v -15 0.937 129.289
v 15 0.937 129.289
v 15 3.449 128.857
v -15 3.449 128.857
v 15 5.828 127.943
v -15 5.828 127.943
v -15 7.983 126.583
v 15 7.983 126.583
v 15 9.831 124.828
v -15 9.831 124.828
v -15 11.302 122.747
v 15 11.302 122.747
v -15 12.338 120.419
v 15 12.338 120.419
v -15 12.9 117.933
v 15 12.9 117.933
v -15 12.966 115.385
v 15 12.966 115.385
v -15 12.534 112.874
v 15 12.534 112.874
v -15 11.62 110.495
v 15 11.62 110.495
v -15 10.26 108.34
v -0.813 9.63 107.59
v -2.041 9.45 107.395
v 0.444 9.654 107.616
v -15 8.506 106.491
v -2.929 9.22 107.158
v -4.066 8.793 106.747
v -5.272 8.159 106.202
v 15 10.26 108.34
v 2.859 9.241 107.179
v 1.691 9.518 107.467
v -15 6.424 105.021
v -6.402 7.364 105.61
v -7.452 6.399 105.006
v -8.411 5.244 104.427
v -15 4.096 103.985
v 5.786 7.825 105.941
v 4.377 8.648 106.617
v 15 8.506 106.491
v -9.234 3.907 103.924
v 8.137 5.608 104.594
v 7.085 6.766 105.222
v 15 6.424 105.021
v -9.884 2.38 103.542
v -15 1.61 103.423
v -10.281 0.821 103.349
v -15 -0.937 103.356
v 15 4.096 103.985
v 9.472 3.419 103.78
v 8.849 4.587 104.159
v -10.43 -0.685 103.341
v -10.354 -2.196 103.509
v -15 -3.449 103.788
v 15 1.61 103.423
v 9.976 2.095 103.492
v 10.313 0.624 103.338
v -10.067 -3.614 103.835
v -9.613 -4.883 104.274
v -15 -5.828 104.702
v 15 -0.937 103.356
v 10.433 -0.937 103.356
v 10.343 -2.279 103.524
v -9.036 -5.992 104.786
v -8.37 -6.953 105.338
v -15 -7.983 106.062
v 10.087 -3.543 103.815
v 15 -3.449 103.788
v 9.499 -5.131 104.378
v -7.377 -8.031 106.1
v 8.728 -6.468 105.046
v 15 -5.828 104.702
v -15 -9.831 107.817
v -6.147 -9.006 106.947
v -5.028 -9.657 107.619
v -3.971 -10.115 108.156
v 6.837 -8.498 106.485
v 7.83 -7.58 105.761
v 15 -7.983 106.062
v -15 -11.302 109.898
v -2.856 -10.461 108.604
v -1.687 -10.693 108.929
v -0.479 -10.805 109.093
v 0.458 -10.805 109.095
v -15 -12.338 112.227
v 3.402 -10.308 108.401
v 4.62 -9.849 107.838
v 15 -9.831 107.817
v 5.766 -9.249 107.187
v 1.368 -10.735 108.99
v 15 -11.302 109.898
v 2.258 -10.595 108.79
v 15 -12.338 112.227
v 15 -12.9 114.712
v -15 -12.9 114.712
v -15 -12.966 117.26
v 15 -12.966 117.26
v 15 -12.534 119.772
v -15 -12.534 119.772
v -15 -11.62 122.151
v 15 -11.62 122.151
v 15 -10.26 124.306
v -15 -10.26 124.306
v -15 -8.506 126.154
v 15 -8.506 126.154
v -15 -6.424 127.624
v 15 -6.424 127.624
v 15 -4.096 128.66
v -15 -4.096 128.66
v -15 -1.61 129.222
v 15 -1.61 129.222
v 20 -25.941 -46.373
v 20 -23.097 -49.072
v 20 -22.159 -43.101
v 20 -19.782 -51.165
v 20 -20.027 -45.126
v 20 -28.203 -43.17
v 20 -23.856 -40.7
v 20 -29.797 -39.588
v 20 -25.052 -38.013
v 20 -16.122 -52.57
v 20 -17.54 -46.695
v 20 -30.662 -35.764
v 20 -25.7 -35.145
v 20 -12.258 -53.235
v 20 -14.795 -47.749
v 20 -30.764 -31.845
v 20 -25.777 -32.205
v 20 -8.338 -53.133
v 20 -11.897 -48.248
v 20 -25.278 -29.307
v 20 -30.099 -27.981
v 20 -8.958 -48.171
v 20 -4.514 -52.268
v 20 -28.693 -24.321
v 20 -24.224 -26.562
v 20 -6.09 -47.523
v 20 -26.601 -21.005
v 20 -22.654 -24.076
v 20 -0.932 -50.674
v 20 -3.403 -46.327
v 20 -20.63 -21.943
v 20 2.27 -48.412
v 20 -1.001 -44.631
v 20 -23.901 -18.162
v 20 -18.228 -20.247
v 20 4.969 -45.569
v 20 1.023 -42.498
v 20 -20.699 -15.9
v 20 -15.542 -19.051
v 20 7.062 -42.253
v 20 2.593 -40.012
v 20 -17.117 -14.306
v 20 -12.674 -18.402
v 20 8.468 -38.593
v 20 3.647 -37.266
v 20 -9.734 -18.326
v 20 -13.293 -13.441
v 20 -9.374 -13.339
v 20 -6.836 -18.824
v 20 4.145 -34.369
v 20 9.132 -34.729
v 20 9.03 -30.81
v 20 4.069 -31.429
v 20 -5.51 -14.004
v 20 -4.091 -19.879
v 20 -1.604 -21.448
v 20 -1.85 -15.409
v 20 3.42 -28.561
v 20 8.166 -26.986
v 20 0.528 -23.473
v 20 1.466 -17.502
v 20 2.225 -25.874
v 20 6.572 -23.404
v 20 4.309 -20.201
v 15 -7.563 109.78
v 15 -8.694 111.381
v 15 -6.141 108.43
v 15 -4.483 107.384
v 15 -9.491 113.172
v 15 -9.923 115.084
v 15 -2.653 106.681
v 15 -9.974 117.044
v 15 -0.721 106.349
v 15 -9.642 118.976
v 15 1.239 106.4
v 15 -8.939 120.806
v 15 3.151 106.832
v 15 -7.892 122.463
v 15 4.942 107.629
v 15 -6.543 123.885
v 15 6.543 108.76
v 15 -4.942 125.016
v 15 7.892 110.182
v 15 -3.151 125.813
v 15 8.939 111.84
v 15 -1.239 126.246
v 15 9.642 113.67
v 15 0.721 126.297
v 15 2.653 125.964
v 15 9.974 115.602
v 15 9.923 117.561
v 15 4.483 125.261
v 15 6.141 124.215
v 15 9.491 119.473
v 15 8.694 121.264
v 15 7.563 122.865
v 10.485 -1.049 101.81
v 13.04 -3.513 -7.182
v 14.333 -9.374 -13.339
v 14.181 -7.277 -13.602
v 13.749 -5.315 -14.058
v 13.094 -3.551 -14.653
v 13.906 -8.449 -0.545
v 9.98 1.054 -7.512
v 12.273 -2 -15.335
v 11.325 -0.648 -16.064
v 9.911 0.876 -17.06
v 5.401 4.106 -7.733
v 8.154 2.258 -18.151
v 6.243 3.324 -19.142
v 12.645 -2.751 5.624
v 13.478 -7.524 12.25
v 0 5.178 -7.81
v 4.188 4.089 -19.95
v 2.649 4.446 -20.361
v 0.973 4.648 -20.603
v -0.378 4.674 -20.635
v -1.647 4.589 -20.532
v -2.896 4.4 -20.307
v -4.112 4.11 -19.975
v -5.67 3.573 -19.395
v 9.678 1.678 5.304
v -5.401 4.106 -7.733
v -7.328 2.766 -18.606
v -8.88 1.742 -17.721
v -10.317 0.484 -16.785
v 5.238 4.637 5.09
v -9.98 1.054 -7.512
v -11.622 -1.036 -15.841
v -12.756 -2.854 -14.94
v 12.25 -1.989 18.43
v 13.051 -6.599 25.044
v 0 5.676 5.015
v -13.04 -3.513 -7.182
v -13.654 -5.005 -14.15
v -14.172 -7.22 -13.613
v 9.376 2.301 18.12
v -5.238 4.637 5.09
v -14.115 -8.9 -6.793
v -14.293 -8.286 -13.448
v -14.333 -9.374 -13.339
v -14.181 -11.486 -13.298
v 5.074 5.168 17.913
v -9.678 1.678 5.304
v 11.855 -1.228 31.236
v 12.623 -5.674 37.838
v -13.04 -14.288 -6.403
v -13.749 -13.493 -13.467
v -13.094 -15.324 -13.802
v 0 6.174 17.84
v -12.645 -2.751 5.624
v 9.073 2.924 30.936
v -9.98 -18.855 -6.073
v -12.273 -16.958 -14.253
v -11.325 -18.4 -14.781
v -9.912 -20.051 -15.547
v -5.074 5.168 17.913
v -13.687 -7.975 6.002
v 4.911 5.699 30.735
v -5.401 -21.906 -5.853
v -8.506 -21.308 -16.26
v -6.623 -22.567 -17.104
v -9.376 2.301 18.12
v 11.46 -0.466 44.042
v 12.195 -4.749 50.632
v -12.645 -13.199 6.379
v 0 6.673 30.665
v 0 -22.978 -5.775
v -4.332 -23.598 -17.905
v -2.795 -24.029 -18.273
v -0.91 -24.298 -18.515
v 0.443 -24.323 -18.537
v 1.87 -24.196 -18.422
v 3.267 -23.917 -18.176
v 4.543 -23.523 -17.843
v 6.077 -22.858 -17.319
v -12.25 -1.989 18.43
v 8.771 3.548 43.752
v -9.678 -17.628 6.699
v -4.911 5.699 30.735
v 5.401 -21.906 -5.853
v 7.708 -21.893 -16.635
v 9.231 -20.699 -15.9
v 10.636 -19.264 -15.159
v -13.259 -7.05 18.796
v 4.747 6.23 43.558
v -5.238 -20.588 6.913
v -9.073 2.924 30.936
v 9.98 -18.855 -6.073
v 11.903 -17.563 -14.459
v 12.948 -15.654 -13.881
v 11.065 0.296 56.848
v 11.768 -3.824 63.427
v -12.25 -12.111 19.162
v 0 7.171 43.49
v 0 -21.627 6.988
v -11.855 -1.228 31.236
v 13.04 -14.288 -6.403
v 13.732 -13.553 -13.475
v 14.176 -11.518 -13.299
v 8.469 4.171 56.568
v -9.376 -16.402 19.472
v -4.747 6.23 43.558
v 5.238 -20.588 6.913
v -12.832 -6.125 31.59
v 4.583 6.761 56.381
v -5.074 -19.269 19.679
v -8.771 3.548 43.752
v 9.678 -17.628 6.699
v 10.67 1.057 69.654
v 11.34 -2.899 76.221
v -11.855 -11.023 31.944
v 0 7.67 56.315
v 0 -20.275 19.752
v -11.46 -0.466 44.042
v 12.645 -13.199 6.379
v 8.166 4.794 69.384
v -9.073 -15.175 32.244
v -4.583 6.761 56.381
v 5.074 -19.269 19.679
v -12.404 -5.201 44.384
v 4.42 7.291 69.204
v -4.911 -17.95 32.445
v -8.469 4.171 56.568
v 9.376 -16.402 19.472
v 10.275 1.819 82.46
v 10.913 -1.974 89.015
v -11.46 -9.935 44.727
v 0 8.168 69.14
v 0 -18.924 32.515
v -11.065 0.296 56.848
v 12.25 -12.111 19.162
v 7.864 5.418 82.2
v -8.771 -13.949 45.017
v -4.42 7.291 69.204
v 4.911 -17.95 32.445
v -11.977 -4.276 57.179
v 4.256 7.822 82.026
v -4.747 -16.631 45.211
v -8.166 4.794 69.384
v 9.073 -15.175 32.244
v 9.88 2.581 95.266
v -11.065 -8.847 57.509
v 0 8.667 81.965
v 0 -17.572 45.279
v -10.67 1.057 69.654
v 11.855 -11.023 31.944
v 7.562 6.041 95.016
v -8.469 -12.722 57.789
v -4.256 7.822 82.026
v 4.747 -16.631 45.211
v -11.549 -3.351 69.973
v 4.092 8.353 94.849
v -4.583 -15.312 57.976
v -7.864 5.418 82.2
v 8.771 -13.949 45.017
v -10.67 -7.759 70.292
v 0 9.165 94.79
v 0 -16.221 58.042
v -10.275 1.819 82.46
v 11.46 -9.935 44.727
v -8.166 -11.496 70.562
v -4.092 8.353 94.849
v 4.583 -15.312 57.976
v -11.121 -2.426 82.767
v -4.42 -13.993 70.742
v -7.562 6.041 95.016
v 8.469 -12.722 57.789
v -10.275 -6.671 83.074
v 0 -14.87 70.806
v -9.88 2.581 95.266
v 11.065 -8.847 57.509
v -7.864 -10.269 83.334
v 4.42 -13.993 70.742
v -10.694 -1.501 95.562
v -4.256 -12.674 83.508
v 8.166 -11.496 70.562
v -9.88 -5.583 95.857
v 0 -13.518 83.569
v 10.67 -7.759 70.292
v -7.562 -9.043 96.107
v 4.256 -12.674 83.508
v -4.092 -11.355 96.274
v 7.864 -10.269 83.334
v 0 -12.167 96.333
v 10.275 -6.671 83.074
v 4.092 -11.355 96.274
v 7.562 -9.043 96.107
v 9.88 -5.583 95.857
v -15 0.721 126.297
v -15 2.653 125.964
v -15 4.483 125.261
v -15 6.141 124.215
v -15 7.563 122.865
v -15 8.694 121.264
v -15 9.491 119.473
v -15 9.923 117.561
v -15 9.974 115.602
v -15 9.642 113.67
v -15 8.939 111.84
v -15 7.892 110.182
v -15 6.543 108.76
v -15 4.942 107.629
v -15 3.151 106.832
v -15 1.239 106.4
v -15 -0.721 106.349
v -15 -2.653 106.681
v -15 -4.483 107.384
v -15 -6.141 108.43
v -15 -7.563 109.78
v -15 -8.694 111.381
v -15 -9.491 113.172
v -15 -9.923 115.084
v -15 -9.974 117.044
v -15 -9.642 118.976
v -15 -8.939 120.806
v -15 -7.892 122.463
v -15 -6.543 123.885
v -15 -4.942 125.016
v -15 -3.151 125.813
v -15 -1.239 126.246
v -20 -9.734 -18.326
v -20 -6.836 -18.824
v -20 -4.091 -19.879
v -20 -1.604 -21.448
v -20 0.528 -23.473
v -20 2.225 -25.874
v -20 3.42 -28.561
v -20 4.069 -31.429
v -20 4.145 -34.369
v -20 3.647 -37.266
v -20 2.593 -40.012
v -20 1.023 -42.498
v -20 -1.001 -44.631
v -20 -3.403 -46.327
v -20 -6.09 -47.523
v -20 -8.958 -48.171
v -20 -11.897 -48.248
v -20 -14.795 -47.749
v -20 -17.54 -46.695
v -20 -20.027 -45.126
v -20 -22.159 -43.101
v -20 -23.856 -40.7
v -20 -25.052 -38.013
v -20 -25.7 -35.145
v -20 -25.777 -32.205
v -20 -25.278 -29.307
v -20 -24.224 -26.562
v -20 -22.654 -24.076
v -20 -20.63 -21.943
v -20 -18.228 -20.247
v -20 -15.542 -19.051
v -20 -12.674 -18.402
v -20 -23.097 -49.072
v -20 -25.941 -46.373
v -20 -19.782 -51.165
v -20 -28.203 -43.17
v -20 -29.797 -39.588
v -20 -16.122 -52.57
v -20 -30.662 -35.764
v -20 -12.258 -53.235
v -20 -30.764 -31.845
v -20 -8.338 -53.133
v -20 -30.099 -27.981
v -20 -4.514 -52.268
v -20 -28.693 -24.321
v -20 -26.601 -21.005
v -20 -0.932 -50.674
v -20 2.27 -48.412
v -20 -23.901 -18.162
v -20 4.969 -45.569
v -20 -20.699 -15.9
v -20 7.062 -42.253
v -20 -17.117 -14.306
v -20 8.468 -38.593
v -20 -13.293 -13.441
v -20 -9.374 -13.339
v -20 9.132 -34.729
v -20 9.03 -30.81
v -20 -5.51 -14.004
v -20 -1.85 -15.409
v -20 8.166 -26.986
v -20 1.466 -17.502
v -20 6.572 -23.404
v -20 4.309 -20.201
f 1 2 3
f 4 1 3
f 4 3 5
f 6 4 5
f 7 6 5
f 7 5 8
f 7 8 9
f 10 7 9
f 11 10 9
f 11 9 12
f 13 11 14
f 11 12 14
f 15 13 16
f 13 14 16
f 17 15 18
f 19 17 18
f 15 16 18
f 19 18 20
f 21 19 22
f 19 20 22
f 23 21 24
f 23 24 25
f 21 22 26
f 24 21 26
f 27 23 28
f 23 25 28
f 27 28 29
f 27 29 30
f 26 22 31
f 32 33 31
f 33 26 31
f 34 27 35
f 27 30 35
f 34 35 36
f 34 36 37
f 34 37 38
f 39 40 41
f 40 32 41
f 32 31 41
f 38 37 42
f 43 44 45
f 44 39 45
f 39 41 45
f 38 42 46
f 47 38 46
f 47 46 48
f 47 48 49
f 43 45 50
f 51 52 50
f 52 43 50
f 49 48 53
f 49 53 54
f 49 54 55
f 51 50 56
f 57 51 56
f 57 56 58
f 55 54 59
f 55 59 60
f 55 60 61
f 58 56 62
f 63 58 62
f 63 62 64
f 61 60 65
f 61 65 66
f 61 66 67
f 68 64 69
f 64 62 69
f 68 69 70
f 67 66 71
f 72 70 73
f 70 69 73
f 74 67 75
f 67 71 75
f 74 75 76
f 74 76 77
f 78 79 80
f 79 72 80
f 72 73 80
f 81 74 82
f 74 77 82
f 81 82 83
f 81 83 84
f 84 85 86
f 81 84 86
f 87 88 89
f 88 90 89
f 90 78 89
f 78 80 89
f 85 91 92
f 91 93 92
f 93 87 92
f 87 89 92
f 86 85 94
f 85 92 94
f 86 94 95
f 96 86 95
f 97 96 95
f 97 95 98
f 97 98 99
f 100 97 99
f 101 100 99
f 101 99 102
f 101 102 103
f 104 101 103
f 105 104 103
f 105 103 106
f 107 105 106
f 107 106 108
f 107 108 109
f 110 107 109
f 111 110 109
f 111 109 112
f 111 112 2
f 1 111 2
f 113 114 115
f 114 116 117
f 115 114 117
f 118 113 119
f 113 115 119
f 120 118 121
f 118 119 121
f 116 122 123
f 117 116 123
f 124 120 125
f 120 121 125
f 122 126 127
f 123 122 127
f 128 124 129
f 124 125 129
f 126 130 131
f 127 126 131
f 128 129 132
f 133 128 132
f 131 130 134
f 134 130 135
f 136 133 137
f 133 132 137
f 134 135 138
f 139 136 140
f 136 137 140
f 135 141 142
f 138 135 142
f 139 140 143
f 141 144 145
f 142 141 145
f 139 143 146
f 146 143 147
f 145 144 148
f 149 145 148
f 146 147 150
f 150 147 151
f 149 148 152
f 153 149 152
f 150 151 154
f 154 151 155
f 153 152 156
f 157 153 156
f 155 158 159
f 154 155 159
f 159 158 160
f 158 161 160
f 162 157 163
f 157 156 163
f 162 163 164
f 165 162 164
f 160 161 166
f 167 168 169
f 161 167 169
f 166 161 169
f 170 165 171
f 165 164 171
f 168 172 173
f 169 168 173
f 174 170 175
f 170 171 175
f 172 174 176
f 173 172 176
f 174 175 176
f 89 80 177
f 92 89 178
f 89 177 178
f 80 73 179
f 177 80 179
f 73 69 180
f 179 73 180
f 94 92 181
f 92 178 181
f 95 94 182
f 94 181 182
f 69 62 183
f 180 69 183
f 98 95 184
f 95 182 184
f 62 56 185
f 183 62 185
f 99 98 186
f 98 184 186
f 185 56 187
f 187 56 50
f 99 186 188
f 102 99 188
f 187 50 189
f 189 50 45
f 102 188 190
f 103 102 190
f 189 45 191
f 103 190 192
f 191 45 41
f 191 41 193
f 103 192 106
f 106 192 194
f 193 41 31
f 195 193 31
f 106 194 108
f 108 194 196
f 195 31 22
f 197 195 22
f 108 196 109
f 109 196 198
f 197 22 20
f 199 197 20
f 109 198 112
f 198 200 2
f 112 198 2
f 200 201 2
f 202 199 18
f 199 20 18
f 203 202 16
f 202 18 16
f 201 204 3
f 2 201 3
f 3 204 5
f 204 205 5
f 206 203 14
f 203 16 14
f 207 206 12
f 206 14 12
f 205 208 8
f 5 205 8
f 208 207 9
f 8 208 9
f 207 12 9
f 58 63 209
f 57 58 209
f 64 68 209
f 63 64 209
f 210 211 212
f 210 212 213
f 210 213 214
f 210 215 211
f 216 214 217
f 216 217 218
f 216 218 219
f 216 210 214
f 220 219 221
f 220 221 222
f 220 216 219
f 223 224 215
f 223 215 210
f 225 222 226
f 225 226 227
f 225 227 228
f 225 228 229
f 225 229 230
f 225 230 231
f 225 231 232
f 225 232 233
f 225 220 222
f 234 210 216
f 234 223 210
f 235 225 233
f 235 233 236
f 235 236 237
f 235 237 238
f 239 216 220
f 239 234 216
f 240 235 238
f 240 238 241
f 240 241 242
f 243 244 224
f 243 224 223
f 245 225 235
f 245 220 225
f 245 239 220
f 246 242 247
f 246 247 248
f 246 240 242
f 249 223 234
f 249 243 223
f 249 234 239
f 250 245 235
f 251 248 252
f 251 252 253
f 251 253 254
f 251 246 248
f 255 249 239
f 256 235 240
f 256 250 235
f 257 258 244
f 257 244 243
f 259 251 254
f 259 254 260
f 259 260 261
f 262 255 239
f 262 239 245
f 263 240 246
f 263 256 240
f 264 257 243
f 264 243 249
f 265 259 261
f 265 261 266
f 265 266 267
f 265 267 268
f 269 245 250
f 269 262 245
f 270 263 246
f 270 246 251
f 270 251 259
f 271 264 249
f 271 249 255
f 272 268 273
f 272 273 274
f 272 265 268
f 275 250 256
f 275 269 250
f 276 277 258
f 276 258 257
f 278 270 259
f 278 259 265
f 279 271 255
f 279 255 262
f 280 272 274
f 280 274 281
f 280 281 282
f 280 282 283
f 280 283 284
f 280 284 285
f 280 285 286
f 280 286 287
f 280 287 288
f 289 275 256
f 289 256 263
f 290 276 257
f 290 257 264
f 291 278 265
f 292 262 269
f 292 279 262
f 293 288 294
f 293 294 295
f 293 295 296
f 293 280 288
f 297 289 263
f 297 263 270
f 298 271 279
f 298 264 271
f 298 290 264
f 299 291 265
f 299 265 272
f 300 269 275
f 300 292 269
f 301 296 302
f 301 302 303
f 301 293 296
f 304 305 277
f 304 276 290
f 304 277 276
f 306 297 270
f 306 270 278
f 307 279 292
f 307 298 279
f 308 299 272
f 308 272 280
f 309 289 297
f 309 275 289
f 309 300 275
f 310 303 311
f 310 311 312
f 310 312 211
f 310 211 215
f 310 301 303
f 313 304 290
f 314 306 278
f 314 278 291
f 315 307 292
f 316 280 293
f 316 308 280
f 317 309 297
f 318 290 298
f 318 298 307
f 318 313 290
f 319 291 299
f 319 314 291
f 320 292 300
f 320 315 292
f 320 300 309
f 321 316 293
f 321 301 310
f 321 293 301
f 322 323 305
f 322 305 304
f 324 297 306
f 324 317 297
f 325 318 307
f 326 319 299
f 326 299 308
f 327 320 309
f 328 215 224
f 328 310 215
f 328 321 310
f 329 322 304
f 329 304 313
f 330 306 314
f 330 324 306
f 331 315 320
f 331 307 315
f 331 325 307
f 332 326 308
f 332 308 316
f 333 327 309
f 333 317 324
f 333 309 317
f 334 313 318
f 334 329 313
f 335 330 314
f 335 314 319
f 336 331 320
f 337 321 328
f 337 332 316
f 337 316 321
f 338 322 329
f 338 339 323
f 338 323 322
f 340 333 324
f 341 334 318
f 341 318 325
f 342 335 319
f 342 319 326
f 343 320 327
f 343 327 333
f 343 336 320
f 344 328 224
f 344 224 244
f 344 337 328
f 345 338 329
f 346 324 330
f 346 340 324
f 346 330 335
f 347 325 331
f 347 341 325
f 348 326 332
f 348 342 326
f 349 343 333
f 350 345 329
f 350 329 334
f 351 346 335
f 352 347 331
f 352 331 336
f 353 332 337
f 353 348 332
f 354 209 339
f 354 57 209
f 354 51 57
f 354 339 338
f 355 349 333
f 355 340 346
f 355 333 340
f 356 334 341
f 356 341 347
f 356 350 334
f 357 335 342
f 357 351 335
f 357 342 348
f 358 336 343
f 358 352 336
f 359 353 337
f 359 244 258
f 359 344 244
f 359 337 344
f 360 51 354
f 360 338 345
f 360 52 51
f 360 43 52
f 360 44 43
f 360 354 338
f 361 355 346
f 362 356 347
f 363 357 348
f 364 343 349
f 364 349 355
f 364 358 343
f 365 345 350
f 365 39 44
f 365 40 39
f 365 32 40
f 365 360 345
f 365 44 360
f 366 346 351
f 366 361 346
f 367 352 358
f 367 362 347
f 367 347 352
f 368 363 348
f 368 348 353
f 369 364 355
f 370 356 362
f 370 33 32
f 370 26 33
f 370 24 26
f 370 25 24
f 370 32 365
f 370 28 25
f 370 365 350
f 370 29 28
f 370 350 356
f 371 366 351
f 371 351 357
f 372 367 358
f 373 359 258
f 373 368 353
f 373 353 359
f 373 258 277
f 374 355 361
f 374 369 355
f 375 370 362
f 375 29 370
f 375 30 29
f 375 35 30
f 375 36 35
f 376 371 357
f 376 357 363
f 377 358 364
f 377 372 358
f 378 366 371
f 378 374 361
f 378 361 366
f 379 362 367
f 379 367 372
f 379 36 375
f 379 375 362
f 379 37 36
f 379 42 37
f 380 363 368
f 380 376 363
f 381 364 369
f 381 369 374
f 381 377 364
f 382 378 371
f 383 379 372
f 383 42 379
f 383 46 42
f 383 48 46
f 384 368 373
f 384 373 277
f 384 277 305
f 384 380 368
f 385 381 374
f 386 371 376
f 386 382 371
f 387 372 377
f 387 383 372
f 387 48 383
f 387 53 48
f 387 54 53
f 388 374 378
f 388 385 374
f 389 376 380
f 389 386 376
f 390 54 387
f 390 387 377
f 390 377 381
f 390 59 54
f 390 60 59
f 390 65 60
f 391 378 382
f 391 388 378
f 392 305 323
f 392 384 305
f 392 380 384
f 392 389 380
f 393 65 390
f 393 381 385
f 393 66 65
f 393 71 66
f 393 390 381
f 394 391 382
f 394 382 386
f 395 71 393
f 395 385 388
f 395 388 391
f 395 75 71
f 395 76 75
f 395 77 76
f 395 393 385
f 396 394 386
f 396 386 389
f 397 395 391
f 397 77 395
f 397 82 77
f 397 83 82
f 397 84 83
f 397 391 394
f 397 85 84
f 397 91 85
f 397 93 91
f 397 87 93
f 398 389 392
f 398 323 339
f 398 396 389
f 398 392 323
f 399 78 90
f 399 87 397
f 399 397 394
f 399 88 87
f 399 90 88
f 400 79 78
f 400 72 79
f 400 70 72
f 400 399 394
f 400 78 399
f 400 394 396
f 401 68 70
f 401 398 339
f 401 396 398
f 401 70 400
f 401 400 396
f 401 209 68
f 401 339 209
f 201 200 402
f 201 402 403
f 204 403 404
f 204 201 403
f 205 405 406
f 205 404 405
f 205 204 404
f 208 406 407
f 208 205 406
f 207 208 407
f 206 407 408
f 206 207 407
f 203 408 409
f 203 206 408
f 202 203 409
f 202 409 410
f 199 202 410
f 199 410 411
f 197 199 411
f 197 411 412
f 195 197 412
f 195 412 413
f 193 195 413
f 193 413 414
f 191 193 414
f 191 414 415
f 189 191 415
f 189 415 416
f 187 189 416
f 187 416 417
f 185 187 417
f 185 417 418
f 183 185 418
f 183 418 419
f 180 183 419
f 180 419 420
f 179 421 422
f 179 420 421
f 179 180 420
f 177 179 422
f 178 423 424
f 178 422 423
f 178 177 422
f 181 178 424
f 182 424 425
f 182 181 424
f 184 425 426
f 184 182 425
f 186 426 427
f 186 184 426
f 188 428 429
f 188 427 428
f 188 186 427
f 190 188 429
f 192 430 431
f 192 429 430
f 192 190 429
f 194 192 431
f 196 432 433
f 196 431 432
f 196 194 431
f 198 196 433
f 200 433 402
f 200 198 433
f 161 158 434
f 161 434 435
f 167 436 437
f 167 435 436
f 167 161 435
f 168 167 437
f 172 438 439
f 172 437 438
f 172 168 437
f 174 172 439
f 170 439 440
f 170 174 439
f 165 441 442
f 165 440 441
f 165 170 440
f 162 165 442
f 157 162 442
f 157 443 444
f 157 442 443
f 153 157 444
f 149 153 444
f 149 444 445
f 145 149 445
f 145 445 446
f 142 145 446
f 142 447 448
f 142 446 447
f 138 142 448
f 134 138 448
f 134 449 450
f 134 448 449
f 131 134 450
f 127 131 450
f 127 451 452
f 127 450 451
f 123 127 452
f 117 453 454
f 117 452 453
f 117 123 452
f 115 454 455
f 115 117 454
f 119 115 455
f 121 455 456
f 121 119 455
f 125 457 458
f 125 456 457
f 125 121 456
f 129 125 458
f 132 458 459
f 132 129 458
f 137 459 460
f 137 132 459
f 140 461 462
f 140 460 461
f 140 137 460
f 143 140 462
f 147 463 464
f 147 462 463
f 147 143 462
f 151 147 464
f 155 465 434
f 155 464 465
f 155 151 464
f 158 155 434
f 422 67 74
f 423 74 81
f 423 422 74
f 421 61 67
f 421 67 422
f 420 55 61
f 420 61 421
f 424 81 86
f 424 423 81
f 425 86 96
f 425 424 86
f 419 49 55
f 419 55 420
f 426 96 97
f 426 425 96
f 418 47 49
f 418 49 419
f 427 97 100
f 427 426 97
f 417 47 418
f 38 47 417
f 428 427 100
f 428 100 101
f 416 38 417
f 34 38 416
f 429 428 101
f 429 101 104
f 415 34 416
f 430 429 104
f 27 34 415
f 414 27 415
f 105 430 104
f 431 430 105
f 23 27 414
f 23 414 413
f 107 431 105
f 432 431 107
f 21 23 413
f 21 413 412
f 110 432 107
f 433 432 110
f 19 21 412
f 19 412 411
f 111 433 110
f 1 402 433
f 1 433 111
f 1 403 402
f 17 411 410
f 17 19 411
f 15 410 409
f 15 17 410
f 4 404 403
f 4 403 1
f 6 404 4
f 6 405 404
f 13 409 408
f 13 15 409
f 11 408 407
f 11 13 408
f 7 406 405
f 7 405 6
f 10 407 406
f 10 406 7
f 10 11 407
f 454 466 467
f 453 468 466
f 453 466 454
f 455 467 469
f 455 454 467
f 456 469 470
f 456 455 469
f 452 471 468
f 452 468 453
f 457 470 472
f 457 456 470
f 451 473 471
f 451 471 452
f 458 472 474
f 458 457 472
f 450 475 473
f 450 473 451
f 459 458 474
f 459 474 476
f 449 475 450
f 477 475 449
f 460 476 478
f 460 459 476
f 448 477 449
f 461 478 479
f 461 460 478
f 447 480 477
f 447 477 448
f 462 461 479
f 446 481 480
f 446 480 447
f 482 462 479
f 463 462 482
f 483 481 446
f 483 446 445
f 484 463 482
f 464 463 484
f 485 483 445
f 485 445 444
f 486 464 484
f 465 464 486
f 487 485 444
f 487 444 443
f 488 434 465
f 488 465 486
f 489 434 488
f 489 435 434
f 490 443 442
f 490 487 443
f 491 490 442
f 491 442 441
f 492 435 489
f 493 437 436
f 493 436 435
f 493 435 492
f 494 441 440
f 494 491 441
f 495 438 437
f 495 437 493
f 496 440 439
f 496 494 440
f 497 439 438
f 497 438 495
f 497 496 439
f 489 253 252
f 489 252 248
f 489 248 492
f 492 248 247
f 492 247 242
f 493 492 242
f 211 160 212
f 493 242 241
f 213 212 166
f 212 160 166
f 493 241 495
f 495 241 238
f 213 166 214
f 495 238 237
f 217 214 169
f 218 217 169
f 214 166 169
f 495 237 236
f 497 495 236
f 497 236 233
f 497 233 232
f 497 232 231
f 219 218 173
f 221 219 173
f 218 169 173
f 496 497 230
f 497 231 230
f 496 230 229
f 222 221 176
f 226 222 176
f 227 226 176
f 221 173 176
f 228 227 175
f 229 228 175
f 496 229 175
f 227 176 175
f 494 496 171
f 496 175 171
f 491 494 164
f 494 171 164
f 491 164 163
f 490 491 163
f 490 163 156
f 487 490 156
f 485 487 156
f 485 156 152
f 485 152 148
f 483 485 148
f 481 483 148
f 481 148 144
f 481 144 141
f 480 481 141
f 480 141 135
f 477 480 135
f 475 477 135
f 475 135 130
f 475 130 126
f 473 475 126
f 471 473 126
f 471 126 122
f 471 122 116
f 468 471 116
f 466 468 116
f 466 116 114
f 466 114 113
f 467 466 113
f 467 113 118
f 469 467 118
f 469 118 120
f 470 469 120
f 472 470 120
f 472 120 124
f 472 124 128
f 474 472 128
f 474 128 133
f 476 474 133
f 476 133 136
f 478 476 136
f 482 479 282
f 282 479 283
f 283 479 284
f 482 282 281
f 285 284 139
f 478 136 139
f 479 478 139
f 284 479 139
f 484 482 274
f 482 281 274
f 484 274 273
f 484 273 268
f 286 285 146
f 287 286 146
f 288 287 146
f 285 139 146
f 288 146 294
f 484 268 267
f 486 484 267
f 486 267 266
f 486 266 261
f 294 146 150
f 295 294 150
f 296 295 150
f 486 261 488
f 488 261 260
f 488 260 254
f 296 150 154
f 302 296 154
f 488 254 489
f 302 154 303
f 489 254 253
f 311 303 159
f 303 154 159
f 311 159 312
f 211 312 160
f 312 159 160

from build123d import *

# Parameters (mm, degrees)
CYLINDER006_R          = 10
CYLINDER006_DEPTH      = 100
CYLINDER007_R          = 15
CYLINDER007_DEPTH      = 100
CYLINDER004_R          = 13
CYLINDER004_DEPTH      = 30
CYLINDER005_R          = 20
CYLINDER005_DEPTH      = 40
CUT004_PLACEMENT_ANGLE = 355.865159


with BuildPart() as cylinder006:
    # Cylinder006 → Cylinder006 (new body)
    with BuildSketch(Plane(origin=(50, 0, 150), x_dir=(0, 0, 1), z_dir=(-1, 0, 0))):
        Circle(CYLINDER006_R)
    extrude(amount=CYLINDER006_DEPTH)


with BuildPart() as compound002:
    # Cylinder007 → Cylinder007 (new body)
    with BuildSketch(Plane.ZY.offset(-50)):
        Circle(CYLINDER007_R)
    extrude(amount=CYLINDER007_DEPTH)

    # Compound002: union Cylinder006
    add(cylinder006.part)


with BuildPart() as cone003:
    # Cone001002 → Cone001002 (revolve)
    with BuildSketch(Plane.XZ):
        Polygon((0, 0), (15, 0), (10, 150), (0, 150), align=None)
    revolve(axis=Axis((0, 0, 0), (0, 0, 1)))


with BuildPart() as cylinder004:
    # Cylinder004 → Cylinder004 (new body)
    with BuildSketch(Plane(origin=(15, 0, 150), x_dir=(0, 0, 1), z_dir=(-1, 0, 0))):
        Circle(CYLINDER004_R)
    extrude(amount=CYLINDER004_DEPTH)


with BuildPart() as crank:
    # Cylinder005 → Cylinder005 (new body)
    with BuildSketch(Plane.ZY.offset(-20)):
        Circle(CYLINDER005_R)
    extrude(amount=CYLINDER005_DEPTH)

    # Fusion002: union Cone003, Cylinder004
    add(cone003.part)
    add(cylinder004.part)

    # Cut004: cut Compound002
    add(compound002.part, mode=Mode.SUBTRACT)


with BuildPart() as crank_1:
    # Cut004 placement: moved
    add(crank.part.moved(Location((0, -10.815595, -33.286978))).rotate(Axis((0, -10.815595, -33.286978), (1, 0, 0)), CUT004_PLACEMENT_ANGLE))


solid = crank_1.part
